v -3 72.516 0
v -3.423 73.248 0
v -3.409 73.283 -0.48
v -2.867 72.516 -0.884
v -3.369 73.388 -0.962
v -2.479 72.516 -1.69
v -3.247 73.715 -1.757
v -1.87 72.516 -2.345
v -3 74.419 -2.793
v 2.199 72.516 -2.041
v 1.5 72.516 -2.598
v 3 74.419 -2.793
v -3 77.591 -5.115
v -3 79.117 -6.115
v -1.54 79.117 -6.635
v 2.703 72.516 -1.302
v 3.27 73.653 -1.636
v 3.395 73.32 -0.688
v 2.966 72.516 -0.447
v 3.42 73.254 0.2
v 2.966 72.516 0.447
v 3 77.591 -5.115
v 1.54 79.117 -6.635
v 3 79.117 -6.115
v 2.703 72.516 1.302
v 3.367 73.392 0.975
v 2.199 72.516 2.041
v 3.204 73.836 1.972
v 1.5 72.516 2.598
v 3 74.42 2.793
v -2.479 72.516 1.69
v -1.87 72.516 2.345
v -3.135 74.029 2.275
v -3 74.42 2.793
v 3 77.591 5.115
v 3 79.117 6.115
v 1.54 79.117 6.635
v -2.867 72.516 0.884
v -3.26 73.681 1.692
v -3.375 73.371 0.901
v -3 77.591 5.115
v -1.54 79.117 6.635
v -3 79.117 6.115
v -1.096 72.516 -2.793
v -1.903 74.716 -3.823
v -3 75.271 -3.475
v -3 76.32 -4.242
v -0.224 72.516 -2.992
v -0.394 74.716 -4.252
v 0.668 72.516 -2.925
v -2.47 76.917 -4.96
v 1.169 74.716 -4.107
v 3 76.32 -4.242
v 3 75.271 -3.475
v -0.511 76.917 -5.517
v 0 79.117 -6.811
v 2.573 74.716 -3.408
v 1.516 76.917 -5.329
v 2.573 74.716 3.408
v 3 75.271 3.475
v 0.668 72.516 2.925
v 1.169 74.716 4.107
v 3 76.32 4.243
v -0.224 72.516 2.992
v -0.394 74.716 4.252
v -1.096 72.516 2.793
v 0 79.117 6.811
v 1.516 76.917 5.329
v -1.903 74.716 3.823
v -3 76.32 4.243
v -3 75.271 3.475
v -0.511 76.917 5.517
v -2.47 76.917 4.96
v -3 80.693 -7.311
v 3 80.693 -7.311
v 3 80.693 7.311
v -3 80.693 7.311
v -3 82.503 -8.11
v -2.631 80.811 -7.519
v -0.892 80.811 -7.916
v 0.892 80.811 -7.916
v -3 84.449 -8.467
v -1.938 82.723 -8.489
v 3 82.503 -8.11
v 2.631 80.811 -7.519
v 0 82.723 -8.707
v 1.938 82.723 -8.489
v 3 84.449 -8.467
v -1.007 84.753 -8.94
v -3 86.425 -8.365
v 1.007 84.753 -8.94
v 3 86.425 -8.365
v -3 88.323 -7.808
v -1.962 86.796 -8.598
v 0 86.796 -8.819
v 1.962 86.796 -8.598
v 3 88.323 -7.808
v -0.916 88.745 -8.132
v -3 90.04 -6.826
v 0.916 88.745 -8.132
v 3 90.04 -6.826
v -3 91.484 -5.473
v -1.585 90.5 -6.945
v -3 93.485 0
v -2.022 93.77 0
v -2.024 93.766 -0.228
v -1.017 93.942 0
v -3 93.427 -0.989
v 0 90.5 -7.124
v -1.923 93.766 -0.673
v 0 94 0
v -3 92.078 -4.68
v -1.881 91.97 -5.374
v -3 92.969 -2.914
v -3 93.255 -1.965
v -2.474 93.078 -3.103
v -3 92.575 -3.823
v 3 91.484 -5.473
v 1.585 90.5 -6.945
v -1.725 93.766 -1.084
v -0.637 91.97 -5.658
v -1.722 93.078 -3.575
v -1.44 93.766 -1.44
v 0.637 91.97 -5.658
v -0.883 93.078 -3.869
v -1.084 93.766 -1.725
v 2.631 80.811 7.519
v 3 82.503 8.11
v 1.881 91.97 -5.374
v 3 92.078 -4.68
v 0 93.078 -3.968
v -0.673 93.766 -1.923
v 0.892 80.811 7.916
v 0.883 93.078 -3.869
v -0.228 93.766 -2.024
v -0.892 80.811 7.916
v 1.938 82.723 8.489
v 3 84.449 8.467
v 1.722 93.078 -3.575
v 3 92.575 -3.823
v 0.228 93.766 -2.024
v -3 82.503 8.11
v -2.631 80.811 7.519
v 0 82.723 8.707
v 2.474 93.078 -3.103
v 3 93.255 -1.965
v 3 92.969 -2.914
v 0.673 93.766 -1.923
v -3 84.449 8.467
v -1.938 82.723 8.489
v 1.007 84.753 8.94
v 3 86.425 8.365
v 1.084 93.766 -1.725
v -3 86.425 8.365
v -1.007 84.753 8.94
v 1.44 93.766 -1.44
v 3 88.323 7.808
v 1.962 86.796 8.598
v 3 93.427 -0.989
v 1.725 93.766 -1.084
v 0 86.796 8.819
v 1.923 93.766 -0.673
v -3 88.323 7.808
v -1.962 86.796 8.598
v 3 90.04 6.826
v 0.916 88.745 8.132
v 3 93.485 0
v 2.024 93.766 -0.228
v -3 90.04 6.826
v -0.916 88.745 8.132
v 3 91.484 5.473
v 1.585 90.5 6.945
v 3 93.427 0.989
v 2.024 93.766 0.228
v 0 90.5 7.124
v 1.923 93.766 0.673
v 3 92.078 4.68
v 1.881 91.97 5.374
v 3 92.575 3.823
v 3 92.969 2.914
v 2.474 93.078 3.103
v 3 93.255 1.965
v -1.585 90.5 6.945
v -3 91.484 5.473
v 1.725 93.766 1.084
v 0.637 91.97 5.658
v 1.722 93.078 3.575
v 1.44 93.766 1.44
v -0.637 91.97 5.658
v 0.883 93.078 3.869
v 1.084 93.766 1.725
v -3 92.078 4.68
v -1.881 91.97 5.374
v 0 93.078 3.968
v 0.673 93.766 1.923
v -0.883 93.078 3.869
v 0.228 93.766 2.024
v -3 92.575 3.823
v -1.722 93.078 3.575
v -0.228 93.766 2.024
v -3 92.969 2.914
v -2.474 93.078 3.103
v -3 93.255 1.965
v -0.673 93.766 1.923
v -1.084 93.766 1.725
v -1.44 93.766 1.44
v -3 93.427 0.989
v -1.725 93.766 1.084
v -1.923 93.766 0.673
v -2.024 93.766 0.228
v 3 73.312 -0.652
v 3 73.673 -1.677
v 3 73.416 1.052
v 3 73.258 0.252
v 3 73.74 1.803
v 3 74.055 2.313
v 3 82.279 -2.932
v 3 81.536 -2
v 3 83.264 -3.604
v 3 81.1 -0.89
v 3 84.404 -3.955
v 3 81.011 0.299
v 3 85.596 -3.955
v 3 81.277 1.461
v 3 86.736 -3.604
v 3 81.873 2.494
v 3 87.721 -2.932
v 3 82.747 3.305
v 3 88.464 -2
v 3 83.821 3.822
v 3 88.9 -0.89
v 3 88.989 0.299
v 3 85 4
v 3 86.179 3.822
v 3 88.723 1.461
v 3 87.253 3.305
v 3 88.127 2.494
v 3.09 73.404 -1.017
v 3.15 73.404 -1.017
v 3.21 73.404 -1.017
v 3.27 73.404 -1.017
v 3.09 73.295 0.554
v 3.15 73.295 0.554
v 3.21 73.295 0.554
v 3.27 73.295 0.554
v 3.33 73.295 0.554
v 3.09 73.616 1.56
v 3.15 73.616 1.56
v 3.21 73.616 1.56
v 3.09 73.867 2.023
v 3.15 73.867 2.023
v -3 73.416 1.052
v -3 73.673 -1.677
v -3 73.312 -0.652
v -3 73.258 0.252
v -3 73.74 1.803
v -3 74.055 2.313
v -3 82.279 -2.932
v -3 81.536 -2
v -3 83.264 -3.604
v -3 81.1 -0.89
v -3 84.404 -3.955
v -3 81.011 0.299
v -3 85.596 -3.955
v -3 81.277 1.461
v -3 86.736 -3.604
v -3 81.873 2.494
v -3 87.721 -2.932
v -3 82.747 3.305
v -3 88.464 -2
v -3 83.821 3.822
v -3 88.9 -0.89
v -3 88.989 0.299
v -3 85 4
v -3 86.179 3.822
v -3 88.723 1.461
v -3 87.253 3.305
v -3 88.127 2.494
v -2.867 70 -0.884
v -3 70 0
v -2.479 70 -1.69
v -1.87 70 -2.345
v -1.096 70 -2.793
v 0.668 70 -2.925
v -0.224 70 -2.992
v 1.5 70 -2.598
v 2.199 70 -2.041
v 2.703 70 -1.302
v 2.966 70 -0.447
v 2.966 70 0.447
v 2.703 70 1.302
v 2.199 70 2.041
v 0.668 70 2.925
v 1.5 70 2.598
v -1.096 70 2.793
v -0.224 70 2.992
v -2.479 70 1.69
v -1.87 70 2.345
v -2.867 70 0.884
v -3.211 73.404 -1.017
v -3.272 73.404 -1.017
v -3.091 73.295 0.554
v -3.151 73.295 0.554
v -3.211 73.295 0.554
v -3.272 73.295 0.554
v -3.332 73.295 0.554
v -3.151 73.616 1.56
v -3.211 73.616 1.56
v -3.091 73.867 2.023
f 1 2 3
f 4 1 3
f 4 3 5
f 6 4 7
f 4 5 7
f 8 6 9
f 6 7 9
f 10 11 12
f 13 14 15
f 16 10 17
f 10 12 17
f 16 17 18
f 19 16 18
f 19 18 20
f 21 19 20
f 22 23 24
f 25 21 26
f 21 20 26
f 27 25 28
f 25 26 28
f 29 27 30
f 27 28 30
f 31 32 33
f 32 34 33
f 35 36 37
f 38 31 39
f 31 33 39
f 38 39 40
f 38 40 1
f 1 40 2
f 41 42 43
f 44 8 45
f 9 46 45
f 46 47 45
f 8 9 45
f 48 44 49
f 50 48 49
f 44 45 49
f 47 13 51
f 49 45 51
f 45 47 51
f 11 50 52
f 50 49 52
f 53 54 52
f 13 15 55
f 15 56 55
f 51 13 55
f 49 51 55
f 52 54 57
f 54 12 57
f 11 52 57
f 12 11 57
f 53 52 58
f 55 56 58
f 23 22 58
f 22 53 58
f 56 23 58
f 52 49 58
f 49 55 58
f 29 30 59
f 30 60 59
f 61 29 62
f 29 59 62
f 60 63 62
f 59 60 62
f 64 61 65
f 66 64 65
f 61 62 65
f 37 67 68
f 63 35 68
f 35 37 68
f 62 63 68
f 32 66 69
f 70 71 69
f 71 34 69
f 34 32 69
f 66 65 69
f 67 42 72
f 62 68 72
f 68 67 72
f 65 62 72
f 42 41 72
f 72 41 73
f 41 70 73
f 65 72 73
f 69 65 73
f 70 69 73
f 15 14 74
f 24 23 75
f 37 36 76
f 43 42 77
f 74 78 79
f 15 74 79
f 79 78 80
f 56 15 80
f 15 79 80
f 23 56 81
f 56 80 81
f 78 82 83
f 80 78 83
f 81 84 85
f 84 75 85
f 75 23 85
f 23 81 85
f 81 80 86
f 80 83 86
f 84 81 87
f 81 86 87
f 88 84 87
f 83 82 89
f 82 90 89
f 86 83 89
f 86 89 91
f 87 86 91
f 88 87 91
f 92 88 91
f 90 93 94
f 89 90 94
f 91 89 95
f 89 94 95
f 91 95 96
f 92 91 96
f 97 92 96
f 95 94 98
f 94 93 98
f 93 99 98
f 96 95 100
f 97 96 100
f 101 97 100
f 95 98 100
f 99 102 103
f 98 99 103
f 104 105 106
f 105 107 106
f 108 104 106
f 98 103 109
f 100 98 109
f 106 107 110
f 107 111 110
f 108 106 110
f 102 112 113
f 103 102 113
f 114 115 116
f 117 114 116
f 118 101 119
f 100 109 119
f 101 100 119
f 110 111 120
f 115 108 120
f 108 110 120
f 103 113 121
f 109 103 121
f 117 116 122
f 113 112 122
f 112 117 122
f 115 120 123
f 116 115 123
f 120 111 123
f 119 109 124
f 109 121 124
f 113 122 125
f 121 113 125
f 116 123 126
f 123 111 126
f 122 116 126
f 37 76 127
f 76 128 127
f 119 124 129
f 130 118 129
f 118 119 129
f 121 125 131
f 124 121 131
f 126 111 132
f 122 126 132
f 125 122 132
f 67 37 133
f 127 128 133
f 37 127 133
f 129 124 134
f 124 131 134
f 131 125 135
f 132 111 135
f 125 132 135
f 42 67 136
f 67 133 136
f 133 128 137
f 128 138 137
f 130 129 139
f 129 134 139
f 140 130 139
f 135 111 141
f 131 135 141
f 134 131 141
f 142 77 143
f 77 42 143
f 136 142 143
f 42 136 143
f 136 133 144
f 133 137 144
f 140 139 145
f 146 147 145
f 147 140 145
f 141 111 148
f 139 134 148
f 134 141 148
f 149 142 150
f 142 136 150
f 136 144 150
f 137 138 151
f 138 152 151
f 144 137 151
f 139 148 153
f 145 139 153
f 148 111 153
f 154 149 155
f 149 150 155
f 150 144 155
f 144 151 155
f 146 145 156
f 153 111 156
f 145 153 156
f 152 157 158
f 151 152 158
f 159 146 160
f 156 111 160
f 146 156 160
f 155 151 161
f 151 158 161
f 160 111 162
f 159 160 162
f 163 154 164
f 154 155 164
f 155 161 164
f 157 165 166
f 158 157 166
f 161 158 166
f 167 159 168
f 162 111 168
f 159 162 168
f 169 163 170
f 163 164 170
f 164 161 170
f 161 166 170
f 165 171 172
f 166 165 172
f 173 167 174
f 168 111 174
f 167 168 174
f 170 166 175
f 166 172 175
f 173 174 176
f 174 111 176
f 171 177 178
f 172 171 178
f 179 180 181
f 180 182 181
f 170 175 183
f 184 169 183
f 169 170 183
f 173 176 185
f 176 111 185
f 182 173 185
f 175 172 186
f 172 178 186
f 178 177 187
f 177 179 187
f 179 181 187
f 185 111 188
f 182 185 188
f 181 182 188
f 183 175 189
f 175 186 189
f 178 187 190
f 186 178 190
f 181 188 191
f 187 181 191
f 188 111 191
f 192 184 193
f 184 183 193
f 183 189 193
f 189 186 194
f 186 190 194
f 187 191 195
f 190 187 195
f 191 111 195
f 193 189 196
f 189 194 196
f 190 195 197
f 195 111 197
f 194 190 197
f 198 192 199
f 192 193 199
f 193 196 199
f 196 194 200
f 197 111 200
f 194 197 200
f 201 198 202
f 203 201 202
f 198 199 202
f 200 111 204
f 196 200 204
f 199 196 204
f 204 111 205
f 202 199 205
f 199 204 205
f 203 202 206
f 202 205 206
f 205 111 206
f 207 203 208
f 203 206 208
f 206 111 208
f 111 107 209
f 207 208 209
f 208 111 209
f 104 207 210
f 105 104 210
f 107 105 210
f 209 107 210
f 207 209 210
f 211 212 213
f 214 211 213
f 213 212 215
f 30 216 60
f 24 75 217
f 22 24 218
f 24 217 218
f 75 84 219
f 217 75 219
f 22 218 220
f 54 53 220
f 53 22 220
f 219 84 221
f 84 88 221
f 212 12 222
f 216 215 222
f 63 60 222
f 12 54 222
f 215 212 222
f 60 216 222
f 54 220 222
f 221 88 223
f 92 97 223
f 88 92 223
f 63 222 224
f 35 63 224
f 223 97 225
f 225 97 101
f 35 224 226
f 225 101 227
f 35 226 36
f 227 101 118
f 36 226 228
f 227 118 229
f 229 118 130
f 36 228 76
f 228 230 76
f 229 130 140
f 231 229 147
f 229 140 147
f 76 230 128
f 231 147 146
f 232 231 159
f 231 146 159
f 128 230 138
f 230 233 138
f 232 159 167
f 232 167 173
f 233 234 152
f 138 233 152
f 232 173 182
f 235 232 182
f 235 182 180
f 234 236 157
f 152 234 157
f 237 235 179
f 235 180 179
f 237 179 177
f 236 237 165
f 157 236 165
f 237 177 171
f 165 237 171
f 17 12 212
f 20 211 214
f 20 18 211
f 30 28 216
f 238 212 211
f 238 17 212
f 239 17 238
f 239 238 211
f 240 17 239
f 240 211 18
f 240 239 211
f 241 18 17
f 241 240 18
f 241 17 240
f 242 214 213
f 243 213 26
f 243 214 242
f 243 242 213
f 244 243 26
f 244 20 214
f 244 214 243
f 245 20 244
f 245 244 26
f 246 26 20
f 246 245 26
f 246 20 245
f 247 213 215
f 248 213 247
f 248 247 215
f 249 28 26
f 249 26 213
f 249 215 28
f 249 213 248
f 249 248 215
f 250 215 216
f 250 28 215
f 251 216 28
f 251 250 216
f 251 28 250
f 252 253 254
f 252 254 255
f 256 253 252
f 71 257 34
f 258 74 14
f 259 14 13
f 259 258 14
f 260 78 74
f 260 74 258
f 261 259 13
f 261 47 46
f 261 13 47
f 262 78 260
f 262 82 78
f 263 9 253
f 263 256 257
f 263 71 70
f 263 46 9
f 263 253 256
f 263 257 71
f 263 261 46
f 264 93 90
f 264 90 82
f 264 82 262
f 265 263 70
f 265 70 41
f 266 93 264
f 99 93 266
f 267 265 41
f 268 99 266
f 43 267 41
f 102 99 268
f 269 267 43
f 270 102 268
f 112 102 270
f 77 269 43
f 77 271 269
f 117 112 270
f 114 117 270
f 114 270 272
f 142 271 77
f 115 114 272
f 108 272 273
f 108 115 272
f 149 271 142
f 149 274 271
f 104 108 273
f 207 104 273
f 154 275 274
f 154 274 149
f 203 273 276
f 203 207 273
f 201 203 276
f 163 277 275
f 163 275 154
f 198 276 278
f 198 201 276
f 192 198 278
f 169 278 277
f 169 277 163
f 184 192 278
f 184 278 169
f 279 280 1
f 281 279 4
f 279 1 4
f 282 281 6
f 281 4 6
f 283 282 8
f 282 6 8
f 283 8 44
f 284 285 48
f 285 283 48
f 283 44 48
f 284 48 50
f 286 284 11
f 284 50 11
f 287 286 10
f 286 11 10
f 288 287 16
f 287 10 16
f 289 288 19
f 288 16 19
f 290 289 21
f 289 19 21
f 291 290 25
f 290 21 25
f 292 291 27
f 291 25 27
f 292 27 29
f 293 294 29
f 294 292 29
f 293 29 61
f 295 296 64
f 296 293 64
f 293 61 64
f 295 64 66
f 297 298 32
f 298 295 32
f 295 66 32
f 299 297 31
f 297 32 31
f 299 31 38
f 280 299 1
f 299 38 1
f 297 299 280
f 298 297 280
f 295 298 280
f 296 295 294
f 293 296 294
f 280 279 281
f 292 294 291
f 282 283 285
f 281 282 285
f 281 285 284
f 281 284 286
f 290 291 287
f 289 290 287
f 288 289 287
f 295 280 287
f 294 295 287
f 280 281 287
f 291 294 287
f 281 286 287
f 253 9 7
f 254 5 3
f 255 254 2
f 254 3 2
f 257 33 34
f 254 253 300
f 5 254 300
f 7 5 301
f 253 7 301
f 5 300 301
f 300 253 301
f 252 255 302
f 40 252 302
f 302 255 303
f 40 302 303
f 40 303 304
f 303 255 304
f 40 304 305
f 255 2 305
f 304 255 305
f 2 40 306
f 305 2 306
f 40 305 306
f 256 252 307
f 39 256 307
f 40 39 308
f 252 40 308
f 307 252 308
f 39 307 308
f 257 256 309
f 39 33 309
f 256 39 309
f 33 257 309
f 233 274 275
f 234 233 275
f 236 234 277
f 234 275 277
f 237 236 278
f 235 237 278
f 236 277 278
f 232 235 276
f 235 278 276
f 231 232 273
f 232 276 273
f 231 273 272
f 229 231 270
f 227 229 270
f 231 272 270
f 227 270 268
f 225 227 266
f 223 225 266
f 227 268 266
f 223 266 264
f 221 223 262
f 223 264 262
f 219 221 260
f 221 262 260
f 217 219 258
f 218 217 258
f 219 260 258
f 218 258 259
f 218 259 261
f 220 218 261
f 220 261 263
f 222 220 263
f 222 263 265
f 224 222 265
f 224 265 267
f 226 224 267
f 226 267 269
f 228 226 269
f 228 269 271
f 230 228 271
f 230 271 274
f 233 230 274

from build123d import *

# Parameters (mm, degrees)
SZKIC2_W                   = 5.611911117
SZKIC2_H                   = 18
WYTNIJ_WYCI_GNI_CIE3_DEPTH = 100
SZKIC3_R                   = 4
WYTNIJ_WYCI_GNI_CIE4_DEPTH = 9
WYTNIJ_WYCI_GNI_CIE5_DEPTH = 1
SZKIC5_R                   = 4
WYTNIJ_WYCI_GNI_CIE6_DEPTH = 70


with BuildPart() as part:
    # Szkic1 → Obrót1 (revolve)
    with BuildSketch(Plane.XY):
        with BuildLine():
            Line((0, 0), (-2, 0))
            Line((-2, 0), (-2, 47.515991356))
            Line((-2, 47.515991356), (-4, 47.515991356))
            Line((-4, 47.515991356), (-4, 52.515991356))
            Line((-4, 52.515991356), (-3, 52.515991356))
            Line((-3, 52.515991356), (-3, 72.515991356))
            Line((-3, 72.515991356), (-6.811196546, 79.117177411))
            ThreePointArc((-6.811196546, 79.117177411), (-8.18368509, 88.745303506), (0, 94))
            Line((0, 94), (0, 87.5))
            ThreePointArc((0, 87.5), (-2.5, 85), (0, 82.5))
            Line((0, 82.5), (0, 0))
        make_face()
    revolve(axis=Axis((0, 82.5, 0), (0, -1, 0)))

    # Szkic2 → Wytnij-wyciągnięcie3 (cut)
    with BuildSketch(Plane(origin=(0, 0, 0), x_dir=(1, 0, 0), z_dir=(0, 1, 0))):
        with Locations((-6.805955559, 0)):
            Rectangle(SZKIC2_W, SZKIC2_H)
        with Locations((6.805955559, 0)):
            Rectangle(SZKIC2_W, SZKIC2_H)
    extrude(amount=WYTNIJ_WYCI_GNI_CIE3_DEPTH, mode=Mode.SUBTRACT)

    # Szkic3 → Wytnij-wyciągnięcie4 (cut, through all)
    with BuildSketch(Plane.ZY.offset(4)):
        with Locations((0, 85)):
            Circle(SZKIC3_R)
    extrude(amount=-WYTNIJ_WYCI_GNI_CIE4_DEPTH, mode=Mode.SUBTRACT)

    # Szkic4 → Wytnij-wyciągnięcie5 (cut)
    with BuildSketch(Plane.ZY.offset(4)):
        with BuildLine():
            ThreePointArc((6.270693727, 78.457606273), (-1.54e-07, 94.062257748), (-6.270693505, 78.45760606))
            add(Edge.make_bspline(
                [(-6.270693505, 78.45760606), (-5.860155238, 77.884005031), (-5.439822901, 77.318273551), (-4.56334323, 76.215587996), (-4.106381954, 75.67754923), (-3.363374021, 74.922329572), (-3.10680463, 74.680734677), (-2.565651322, 74.22947798), (-2.278481074, 74.018621845), (-1.674076312, 73.65846472), (-1.356546022, 73.509032989), (-0.676664628, 73.299784881), (-0.328815369, 73.245372297), (0.202925796, 73.249526844), (0.380729476, 73.265518373), (0.727839454, 73.323535586), (0.898553898, 73.365855519), (1.234860958, 73.474497232), (1.400715996, 73.541171917), (1.719331355, 73.691591375), (1.873358854, 73.775663717), (2.32266111, 74.049331959), (2.606912587, 74.261443159), (3.145505929, 74.716004998), (3.399015103, 74.956985507), (4.130320647, 75.70528438), (4.580547786, 76.236525924), (5.447234702, 77.328310614), (5.863652605, 77.888890096), (6.270693727, 78.457606273)],
                knots=[0, 0, 0, 0, 0.125, 0.125, 0.25, 0.25, 0.3125, 0.3125, 0.375, 0.375, 0.4375, 0.4375, 0.5, 0.5, 0.53125, 0.53125, 0.5625, 0.5625, 0.59375, 0.59375, 0.625, 0.625, 0.6875, 0.6875, 0.75, 0.75, 0.875, 0.875, 1, 1, 1, 1], degree=3))
        make_face()
    wytnij_wyci_gni_cie5 = extrude(amount=-WYTNIJ_WYCI_GNI_CIE5_DEPTH, mode=Mode.SUBTRACT)

    # Lustro1: Wytnij-wyciągnięcie5 across plane
    add(wytnij_wyci_gni_cie5.mirror(Plane(origin=(0, 0, 0), x_dir=(0, 0, 1), z_dir=(1, 0, 0))), mode=Mode.SUBTRACT)

    # Szkic5 → Wytnij-wyciągnięcie6 (cut)
    with BuildSketch(Plane(origin=(0, 0, 0), x_dir=(1, 0, 0), z_dir=(0, 1, 0))):
        Circle(SZKIC5_R)
    extrude(amount=WYTNIJ_WYCI_GNI_CIE6_DEPTH, mode=Mode.SUBTRACT)


solid = part.part
